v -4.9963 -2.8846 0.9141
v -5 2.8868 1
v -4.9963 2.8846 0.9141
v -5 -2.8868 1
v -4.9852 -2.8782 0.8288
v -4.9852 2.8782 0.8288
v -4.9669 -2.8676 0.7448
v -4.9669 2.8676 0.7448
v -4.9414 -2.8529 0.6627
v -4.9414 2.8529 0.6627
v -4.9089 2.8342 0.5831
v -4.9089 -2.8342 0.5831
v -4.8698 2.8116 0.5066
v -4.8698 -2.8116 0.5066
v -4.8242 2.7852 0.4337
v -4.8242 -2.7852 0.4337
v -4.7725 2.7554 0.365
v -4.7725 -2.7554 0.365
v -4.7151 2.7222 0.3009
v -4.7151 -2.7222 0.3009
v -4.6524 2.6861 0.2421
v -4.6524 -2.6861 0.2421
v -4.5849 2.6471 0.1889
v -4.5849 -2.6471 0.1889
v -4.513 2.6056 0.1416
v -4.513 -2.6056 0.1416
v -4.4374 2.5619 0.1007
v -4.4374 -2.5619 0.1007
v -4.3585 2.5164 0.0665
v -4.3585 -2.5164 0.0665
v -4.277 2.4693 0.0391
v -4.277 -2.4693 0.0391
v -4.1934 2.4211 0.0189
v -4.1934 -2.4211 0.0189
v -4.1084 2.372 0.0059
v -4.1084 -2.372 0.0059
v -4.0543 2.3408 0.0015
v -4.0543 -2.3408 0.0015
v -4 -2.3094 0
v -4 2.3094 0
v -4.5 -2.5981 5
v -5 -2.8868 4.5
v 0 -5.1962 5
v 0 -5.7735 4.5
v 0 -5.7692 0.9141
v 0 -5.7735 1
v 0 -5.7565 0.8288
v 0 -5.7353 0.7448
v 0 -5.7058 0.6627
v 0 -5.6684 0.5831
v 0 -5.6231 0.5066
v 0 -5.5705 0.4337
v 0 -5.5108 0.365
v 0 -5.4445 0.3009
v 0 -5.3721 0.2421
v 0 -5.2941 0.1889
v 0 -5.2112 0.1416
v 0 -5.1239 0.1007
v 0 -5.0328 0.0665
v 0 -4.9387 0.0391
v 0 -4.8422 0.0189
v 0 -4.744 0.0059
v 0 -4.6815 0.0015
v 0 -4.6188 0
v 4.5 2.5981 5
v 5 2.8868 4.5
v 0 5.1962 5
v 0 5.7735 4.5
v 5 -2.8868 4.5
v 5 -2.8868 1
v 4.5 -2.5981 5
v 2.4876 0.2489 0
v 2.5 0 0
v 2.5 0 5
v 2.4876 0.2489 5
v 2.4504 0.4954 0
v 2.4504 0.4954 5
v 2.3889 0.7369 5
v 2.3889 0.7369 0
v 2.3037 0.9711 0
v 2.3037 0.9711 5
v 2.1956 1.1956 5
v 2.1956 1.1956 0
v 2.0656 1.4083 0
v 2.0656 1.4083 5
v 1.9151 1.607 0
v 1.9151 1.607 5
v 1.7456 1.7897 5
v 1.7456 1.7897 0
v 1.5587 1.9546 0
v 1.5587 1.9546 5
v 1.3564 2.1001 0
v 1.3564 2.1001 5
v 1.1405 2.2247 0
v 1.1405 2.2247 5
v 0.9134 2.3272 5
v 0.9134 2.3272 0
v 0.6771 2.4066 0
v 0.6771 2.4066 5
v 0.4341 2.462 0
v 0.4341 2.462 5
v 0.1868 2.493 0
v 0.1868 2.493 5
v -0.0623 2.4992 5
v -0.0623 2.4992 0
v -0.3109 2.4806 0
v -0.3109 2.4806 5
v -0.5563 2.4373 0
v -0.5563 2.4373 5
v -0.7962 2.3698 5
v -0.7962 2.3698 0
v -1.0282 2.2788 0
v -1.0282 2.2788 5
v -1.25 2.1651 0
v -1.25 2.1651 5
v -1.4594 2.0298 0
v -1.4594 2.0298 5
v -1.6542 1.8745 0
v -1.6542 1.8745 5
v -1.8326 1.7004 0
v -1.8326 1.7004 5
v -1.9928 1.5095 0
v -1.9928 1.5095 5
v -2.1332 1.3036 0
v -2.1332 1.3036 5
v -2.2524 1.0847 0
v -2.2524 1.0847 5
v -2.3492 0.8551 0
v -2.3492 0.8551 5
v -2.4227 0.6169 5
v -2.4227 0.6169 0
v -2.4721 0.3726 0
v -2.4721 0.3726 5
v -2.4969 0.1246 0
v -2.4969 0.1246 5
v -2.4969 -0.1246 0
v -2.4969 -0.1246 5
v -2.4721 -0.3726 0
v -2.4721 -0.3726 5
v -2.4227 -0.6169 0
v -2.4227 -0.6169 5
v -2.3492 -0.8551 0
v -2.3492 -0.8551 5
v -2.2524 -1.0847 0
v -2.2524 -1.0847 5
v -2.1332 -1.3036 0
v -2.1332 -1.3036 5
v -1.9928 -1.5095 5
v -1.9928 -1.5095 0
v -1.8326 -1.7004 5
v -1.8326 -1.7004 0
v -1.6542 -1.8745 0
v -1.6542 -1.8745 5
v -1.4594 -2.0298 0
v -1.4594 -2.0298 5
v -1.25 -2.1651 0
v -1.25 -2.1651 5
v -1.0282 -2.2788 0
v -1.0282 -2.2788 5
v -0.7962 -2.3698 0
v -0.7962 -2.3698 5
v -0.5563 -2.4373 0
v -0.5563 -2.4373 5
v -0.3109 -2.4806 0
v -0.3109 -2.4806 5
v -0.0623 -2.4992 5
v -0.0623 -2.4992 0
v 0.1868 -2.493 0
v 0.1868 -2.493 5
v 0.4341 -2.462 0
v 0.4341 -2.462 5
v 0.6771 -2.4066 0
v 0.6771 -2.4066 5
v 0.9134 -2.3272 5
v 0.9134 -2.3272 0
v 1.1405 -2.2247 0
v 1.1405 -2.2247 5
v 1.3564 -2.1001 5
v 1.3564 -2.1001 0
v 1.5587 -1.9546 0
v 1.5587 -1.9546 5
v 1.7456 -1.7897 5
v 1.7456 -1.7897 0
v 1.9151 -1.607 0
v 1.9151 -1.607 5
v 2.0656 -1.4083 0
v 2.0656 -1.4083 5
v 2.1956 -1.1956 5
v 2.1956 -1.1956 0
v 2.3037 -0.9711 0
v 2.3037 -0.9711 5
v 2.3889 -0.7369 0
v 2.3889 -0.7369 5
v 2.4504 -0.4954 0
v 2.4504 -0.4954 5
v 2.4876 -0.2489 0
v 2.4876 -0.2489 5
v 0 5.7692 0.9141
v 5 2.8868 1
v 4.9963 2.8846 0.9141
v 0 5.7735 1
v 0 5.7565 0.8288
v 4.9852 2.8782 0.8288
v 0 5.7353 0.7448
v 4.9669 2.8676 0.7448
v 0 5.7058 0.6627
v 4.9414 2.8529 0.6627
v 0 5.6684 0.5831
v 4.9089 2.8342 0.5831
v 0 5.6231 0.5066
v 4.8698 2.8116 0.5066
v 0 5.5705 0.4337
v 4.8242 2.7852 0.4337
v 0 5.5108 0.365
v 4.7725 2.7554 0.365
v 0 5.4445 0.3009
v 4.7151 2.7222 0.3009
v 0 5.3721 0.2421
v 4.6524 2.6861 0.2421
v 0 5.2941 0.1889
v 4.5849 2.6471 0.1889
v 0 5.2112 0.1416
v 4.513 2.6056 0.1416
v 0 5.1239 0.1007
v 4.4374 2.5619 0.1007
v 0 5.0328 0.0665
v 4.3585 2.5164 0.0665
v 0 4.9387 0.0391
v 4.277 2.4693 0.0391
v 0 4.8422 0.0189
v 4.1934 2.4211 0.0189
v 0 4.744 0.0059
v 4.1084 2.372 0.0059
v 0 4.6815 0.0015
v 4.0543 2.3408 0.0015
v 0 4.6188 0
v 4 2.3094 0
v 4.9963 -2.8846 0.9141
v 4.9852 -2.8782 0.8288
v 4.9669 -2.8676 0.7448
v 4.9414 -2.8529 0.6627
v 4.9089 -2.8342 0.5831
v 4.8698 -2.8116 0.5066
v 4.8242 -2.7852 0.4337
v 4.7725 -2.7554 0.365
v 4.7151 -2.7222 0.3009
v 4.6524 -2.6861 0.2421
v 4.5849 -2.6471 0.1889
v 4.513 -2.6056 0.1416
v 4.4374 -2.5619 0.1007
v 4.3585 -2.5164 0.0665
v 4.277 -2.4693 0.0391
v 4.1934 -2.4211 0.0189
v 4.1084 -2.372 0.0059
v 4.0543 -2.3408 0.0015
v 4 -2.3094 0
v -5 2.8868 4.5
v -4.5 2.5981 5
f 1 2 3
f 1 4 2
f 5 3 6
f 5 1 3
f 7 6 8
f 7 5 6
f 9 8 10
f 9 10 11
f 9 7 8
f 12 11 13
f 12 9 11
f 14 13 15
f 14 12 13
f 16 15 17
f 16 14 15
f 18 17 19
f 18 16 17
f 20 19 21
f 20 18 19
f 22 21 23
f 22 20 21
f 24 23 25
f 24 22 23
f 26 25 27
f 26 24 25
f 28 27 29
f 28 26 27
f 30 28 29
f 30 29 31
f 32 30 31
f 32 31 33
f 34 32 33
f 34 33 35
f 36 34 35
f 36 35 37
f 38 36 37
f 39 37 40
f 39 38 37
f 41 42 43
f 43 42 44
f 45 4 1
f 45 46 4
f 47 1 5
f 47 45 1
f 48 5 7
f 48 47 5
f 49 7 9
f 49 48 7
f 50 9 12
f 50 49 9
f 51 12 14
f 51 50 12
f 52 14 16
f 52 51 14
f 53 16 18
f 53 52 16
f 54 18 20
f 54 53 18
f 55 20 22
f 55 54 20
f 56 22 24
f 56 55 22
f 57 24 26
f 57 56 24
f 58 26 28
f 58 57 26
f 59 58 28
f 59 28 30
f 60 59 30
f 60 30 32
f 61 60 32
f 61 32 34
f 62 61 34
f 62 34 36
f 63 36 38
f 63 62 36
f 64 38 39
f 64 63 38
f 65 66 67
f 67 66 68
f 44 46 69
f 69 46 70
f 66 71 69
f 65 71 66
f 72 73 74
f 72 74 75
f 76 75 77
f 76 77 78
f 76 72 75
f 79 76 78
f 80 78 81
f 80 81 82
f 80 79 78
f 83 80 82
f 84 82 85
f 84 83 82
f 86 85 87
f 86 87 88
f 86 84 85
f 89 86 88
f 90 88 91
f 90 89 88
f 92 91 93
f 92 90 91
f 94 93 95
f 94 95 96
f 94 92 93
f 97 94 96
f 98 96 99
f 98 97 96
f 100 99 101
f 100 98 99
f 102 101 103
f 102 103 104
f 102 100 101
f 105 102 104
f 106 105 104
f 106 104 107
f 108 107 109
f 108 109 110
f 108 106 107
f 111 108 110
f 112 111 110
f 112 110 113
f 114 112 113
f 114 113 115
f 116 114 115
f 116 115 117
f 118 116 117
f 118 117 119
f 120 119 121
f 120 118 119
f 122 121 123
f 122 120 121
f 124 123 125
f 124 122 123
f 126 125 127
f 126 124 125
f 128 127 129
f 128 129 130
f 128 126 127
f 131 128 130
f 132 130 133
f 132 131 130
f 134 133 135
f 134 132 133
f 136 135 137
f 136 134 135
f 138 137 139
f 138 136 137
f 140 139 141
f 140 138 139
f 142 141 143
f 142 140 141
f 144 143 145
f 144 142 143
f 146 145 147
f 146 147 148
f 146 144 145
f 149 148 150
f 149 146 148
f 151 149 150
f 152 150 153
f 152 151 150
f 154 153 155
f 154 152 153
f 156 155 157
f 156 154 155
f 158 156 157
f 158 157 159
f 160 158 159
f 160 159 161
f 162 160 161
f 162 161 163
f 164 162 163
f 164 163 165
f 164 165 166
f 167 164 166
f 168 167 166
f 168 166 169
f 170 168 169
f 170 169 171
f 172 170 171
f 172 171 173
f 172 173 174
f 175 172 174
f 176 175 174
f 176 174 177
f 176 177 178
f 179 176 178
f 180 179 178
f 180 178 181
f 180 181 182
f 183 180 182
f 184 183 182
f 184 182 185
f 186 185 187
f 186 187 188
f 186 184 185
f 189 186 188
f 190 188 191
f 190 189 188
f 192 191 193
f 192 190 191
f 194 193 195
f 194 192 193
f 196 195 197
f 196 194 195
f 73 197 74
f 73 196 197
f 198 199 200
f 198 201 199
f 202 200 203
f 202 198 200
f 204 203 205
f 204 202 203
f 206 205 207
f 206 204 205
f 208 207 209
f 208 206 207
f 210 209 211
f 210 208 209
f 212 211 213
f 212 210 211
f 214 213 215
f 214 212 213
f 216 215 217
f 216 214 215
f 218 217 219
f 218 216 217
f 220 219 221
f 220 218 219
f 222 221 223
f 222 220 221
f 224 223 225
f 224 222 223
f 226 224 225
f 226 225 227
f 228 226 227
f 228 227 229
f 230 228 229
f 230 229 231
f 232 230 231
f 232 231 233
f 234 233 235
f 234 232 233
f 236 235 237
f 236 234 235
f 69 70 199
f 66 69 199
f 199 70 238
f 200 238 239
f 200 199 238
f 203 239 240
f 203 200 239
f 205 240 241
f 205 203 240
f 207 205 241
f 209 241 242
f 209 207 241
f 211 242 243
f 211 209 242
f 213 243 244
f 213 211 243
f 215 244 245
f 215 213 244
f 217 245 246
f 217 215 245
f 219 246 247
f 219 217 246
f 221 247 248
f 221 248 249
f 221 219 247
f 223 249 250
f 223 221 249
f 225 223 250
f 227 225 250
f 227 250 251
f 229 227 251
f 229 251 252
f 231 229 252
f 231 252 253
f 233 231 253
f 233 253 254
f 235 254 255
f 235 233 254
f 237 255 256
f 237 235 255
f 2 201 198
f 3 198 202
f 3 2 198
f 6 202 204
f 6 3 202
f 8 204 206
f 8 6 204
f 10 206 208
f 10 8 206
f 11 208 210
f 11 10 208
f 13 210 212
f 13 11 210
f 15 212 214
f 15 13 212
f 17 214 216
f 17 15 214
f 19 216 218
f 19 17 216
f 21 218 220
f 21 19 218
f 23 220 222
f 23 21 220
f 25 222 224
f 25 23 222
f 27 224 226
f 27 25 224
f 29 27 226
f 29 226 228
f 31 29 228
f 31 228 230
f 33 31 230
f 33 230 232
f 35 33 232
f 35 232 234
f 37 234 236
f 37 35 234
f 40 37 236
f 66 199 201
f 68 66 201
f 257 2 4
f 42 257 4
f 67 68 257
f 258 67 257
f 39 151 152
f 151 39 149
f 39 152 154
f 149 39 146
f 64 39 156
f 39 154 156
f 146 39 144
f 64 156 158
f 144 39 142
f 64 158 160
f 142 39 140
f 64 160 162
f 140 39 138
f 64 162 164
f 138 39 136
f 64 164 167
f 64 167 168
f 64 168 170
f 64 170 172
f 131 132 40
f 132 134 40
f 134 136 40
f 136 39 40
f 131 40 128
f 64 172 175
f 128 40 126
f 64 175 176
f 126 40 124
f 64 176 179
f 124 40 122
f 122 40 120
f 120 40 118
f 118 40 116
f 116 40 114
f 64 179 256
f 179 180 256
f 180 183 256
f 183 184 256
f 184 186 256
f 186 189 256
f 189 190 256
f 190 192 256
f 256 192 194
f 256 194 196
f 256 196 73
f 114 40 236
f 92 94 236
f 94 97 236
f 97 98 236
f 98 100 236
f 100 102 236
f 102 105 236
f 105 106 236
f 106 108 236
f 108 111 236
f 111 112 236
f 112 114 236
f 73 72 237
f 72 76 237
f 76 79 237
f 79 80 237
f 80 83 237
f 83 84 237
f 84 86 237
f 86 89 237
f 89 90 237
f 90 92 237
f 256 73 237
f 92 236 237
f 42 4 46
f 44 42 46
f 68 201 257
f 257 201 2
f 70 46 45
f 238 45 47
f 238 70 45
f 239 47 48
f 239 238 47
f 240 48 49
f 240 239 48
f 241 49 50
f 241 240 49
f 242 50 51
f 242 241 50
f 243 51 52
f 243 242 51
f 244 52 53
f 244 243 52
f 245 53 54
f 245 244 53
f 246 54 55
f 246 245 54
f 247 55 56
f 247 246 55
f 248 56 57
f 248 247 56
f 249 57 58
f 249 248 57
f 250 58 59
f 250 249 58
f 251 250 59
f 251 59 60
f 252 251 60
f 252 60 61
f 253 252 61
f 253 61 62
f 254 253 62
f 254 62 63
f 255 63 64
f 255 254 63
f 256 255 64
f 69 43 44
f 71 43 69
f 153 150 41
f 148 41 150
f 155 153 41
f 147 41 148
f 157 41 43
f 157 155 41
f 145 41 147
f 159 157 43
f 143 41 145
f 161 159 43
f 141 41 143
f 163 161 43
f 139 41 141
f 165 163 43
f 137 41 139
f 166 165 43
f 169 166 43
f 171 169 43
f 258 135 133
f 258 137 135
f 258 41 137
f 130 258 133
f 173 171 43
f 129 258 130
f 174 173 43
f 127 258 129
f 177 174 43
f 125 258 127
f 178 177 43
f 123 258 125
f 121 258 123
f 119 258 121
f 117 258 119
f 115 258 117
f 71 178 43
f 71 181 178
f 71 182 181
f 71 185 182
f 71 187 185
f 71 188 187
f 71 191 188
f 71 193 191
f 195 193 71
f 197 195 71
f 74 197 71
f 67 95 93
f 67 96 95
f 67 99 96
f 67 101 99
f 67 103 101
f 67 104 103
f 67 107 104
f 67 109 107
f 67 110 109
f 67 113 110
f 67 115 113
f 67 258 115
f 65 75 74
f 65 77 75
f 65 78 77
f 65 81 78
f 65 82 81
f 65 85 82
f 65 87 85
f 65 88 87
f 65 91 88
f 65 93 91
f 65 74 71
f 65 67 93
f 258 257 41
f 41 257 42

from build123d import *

# Parameters (mm, degrees)
F0_R     = 2.5
F1_DEPTH = 5
F2_R     = 1
F3_SIZE  = 0.5


with BuildPart() as f1:
    # F0 (on Top) → F1 (new body)
    with BuildSketch(Plane.XY):
        Polygon((5, -2.886751), (5, 2.886751), (0, 5.773503), (-5, 2.886751), (-5, -2.886751), (0, -5.773503), align=None)
        Circle(F0_R, mode=Mode.SUBTRACT)
    extrude(amount=F1_DEPTH)

    # F2
    f2_edges = [f1.edges().sort_by_distance(p)[0] for p in [
        (-2.5, -4.330127, 0),
        (2.5, -4.330127, 0),
        (5, 0, 0),
        (2.5, 4.330127, 0),
        (-2.5, 4.330127, 0),
        (-5, 0, 0),
    ]]
    fillet(f2_edges, radius=F2_R)

    # F3
    f3_edges = [f1.edges().sort_by_distance(p)[0] for p in [
        (-2.5, -4.330127, 5),
        (2.5, -4.330127, 5),
        (5, 0, 5),
        (2.5, 4.330127, 5),
        (-2.5, 4.330127, 5),
        (-5, 0, 5),
    ]]
    chamfer(f3_edges, length=F3_SIZE)


solid = f1.part
